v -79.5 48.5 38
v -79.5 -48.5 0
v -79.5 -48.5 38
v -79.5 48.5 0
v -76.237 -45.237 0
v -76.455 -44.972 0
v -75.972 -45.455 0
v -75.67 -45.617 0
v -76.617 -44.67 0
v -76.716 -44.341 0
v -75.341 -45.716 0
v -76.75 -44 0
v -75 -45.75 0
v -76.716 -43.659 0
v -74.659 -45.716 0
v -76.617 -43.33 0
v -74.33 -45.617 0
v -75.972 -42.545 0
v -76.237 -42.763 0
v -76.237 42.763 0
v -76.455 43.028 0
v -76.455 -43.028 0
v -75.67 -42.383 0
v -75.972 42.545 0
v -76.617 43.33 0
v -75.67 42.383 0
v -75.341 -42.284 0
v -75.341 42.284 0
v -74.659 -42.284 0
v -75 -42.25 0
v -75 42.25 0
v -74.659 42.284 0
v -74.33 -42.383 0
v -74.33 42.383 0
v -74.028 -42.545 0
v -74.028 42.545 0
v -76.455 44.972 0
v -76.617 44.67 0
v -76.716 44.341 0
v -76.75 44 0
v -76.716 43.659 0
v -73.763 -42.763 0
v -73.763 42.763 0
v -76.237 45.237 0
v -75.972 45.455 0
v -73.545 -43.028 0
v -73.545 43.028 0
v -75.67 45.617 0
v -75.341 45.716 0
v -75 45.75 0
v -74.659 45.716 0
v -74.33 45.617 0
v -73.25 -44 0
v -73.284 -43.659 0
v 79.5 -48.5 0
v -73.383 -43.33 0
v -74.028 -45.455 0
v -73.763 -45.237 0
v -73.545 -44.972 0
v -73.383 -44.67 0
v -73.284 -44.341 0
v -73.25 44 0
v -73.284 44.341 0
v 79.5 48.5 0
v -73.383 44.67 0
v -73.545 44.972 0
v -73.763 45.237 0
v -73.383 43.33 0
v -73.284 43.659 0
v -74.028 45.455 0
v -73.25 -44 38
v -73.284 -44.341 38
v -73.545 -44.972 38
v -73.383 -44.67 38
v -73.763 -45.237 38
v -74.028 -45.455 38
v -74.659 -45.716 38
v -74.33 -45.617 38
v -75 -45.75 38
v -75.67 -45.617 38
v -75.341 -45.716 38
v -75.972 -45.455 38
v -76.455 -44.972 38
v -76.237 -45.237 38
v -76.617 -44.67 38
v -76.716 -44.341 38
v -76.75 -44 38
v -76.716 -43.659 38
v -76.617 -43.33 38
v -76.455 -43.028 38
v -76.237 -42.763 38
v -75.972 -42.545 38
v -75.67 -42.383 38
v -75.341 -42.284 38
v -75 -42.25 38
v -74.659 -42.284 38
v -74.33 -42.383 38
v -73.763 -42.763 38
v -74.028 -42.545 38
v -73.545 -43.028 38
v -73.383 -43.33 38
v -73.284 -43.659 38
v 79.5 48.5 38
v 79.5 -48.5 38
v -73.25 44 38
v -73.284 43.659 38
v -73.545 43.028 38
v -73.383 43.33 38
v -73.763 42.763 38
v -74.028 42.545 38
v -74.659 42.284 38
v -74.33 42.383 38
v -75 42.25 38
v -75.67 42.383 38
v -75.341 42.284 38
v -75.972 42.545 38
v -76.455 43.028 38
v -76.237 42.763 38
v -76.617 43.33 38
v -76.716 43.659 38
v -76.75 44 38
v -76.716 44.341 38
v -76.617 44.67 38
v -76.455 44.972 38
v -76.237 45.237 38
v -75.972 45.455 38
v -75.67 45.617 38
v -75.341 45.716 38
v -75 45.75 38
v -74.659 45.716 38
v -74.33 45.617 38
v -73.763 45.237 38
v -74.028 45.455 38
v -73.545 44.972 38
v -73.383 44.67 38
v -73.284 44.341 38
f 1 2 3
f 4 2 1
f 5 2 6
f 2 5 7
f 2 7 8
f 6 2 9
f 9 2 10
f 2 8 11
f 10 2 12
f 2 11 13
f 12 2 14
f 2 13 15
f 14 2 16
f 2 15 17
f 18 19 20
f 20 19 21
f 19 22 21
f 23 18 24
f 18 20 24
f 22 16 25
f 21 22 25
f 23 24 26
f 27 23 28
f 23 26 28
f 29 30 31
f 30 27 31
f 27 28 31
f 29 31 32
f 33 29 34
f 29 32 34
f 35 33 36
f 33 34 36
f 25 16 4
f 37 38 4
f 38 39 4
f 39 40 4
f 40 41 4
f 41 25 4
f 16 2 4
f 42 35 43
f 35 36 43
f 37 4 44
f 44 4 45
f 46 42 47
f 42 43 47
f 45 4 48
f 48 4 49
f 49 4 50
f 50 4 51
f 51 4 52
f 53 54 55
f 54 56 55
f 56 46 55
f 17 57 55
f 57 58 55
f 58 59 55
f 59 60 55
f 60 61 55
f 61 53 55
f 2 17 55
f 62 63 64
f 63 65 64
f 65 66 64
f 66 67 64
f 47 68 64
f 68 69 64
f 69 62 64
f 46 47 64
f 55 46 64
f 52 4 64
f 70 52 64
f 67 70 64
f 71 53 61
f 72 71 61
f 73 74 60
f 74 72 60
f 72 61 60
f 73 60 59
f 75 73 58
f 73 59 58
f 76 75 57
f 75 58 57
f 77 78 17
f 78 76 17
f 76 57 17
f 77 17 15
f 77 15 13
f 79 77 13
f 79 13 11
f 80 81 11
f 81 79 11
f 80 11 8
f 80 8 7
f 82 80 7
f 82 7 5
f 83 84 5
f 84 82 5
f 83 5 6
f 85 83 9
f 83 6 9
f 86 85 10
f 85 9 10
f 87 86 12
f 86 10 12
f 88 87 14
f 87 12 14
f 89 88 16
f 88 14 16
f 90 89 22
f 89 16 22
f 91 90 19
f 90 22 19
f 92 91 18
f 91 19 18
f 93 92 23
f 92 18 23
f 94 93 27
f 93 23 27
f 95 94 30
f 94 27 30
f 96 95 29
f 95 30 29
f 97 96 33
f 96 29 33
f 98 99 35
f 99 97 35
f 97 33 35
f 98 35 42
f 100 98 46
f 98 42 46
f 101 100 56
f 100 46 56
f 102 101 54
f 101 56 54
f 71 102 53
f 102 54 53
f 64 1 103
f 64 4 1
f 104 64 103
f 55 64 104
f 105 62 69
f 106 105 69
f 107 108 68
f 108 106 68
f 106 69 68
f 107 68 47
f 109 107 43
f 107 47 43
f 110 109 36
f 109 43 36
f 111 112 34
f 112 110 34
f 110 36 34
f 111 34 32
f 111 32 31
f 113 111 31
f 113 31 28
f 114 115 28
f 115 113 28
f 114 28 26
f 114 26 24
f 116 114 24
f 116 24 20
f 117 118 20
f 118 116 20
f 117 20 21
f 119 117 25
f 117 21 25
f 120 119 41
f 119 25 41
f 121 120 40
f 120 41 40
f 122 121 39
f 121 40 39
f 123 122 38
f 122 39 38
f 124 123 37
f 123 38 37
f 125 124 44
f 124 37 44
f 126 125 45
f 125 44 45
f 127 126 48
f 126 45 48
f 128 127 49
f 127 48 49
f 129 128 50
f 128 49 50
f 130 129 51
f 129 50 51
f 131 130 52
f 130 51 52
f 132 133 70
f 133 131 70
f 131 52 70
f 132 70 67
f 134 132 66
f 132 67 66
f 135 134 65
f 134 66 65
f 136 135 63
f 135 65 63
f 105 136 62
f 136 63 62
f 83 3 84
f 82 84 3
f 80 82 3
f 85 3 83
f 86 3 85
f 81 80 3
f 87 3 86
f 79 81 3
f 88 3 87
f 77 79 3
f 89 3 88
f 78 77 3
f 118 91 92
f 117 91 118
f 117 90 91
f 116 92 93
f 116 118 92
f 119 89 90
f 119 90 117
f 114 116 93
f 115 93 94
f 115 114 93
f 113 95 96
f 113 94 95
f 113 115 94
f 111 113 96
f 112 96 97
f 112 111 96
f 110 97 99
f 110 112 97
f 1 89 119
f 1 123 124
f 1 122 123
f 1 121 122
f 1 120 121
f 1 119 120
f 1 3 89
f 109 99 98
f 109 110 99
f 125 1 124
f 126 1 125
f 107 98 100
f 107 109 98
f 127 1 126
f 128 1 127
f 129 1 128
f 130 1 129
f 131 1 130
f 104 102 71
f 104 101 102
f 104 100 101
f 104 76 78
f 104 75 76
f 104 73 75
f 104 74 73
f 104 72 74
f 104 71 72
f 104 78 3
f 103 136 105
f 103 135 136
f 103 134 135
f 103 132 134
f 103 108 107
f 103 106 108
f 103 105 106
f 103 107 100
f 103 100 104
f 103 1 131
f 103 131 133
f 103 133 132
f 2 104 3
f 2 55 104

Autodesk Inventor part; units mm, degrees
ref_plane "YZ Plane" through (0, 0, 0) normal (1, 0, 0) x (0, 1, 0)
ref_plane "XZ Plane" through (0, 0, 0) normal (0, 1, 0) x (-1, 0, 0)
ref_plane "XY Plane" through (0, 0, 0) normal (0, 0, 1) x (1, 0, 0)
sketch "스케치1" plane through (0, 0, 0) normal (0, 0, 1) x (1, 0, 0)
  line L0 (-79.5, 48.5) -> (79.5, 48.5)
  line L1 (79.5, 48.5) -> (79.5, -48.5)
  line L2 (79.5, -48.5) -> (-79.5, -48.5)
  line L3 (-79.5, -48.5) -> (-79.5, 48.5)
  line L4 (-79.5, 48.5) -> (79.5, -48.5) construction
  line L5 (79.5, 48.5) -> (-79.5, -48.5) construction
  line L6 (-91.9522, 44) -> (117.9922, 44) construction
  line L7 (-91.9522, -44) -> (123.3329, -44) construction
  line L8 (-75, 56.2036) -> (-75, -62.2124) construction
  circle A0 centre (-75, 44) radius 1.75
  circle A1 centre (-75, -44) radius 1.75
  point P0 (0, 0)
  dimension "d0" = 159
  dimension "d1" = 97
  dimension "d2" = 4.5
  dimension "d3" = 4.5
  dimension "d4" = 4.5
  dimension "d5" = 3.5
  dimension "d6" = 3.5
extrude "돌출1" add sketch "스케치1" along normal blind 38
properties part number "SMPS"
